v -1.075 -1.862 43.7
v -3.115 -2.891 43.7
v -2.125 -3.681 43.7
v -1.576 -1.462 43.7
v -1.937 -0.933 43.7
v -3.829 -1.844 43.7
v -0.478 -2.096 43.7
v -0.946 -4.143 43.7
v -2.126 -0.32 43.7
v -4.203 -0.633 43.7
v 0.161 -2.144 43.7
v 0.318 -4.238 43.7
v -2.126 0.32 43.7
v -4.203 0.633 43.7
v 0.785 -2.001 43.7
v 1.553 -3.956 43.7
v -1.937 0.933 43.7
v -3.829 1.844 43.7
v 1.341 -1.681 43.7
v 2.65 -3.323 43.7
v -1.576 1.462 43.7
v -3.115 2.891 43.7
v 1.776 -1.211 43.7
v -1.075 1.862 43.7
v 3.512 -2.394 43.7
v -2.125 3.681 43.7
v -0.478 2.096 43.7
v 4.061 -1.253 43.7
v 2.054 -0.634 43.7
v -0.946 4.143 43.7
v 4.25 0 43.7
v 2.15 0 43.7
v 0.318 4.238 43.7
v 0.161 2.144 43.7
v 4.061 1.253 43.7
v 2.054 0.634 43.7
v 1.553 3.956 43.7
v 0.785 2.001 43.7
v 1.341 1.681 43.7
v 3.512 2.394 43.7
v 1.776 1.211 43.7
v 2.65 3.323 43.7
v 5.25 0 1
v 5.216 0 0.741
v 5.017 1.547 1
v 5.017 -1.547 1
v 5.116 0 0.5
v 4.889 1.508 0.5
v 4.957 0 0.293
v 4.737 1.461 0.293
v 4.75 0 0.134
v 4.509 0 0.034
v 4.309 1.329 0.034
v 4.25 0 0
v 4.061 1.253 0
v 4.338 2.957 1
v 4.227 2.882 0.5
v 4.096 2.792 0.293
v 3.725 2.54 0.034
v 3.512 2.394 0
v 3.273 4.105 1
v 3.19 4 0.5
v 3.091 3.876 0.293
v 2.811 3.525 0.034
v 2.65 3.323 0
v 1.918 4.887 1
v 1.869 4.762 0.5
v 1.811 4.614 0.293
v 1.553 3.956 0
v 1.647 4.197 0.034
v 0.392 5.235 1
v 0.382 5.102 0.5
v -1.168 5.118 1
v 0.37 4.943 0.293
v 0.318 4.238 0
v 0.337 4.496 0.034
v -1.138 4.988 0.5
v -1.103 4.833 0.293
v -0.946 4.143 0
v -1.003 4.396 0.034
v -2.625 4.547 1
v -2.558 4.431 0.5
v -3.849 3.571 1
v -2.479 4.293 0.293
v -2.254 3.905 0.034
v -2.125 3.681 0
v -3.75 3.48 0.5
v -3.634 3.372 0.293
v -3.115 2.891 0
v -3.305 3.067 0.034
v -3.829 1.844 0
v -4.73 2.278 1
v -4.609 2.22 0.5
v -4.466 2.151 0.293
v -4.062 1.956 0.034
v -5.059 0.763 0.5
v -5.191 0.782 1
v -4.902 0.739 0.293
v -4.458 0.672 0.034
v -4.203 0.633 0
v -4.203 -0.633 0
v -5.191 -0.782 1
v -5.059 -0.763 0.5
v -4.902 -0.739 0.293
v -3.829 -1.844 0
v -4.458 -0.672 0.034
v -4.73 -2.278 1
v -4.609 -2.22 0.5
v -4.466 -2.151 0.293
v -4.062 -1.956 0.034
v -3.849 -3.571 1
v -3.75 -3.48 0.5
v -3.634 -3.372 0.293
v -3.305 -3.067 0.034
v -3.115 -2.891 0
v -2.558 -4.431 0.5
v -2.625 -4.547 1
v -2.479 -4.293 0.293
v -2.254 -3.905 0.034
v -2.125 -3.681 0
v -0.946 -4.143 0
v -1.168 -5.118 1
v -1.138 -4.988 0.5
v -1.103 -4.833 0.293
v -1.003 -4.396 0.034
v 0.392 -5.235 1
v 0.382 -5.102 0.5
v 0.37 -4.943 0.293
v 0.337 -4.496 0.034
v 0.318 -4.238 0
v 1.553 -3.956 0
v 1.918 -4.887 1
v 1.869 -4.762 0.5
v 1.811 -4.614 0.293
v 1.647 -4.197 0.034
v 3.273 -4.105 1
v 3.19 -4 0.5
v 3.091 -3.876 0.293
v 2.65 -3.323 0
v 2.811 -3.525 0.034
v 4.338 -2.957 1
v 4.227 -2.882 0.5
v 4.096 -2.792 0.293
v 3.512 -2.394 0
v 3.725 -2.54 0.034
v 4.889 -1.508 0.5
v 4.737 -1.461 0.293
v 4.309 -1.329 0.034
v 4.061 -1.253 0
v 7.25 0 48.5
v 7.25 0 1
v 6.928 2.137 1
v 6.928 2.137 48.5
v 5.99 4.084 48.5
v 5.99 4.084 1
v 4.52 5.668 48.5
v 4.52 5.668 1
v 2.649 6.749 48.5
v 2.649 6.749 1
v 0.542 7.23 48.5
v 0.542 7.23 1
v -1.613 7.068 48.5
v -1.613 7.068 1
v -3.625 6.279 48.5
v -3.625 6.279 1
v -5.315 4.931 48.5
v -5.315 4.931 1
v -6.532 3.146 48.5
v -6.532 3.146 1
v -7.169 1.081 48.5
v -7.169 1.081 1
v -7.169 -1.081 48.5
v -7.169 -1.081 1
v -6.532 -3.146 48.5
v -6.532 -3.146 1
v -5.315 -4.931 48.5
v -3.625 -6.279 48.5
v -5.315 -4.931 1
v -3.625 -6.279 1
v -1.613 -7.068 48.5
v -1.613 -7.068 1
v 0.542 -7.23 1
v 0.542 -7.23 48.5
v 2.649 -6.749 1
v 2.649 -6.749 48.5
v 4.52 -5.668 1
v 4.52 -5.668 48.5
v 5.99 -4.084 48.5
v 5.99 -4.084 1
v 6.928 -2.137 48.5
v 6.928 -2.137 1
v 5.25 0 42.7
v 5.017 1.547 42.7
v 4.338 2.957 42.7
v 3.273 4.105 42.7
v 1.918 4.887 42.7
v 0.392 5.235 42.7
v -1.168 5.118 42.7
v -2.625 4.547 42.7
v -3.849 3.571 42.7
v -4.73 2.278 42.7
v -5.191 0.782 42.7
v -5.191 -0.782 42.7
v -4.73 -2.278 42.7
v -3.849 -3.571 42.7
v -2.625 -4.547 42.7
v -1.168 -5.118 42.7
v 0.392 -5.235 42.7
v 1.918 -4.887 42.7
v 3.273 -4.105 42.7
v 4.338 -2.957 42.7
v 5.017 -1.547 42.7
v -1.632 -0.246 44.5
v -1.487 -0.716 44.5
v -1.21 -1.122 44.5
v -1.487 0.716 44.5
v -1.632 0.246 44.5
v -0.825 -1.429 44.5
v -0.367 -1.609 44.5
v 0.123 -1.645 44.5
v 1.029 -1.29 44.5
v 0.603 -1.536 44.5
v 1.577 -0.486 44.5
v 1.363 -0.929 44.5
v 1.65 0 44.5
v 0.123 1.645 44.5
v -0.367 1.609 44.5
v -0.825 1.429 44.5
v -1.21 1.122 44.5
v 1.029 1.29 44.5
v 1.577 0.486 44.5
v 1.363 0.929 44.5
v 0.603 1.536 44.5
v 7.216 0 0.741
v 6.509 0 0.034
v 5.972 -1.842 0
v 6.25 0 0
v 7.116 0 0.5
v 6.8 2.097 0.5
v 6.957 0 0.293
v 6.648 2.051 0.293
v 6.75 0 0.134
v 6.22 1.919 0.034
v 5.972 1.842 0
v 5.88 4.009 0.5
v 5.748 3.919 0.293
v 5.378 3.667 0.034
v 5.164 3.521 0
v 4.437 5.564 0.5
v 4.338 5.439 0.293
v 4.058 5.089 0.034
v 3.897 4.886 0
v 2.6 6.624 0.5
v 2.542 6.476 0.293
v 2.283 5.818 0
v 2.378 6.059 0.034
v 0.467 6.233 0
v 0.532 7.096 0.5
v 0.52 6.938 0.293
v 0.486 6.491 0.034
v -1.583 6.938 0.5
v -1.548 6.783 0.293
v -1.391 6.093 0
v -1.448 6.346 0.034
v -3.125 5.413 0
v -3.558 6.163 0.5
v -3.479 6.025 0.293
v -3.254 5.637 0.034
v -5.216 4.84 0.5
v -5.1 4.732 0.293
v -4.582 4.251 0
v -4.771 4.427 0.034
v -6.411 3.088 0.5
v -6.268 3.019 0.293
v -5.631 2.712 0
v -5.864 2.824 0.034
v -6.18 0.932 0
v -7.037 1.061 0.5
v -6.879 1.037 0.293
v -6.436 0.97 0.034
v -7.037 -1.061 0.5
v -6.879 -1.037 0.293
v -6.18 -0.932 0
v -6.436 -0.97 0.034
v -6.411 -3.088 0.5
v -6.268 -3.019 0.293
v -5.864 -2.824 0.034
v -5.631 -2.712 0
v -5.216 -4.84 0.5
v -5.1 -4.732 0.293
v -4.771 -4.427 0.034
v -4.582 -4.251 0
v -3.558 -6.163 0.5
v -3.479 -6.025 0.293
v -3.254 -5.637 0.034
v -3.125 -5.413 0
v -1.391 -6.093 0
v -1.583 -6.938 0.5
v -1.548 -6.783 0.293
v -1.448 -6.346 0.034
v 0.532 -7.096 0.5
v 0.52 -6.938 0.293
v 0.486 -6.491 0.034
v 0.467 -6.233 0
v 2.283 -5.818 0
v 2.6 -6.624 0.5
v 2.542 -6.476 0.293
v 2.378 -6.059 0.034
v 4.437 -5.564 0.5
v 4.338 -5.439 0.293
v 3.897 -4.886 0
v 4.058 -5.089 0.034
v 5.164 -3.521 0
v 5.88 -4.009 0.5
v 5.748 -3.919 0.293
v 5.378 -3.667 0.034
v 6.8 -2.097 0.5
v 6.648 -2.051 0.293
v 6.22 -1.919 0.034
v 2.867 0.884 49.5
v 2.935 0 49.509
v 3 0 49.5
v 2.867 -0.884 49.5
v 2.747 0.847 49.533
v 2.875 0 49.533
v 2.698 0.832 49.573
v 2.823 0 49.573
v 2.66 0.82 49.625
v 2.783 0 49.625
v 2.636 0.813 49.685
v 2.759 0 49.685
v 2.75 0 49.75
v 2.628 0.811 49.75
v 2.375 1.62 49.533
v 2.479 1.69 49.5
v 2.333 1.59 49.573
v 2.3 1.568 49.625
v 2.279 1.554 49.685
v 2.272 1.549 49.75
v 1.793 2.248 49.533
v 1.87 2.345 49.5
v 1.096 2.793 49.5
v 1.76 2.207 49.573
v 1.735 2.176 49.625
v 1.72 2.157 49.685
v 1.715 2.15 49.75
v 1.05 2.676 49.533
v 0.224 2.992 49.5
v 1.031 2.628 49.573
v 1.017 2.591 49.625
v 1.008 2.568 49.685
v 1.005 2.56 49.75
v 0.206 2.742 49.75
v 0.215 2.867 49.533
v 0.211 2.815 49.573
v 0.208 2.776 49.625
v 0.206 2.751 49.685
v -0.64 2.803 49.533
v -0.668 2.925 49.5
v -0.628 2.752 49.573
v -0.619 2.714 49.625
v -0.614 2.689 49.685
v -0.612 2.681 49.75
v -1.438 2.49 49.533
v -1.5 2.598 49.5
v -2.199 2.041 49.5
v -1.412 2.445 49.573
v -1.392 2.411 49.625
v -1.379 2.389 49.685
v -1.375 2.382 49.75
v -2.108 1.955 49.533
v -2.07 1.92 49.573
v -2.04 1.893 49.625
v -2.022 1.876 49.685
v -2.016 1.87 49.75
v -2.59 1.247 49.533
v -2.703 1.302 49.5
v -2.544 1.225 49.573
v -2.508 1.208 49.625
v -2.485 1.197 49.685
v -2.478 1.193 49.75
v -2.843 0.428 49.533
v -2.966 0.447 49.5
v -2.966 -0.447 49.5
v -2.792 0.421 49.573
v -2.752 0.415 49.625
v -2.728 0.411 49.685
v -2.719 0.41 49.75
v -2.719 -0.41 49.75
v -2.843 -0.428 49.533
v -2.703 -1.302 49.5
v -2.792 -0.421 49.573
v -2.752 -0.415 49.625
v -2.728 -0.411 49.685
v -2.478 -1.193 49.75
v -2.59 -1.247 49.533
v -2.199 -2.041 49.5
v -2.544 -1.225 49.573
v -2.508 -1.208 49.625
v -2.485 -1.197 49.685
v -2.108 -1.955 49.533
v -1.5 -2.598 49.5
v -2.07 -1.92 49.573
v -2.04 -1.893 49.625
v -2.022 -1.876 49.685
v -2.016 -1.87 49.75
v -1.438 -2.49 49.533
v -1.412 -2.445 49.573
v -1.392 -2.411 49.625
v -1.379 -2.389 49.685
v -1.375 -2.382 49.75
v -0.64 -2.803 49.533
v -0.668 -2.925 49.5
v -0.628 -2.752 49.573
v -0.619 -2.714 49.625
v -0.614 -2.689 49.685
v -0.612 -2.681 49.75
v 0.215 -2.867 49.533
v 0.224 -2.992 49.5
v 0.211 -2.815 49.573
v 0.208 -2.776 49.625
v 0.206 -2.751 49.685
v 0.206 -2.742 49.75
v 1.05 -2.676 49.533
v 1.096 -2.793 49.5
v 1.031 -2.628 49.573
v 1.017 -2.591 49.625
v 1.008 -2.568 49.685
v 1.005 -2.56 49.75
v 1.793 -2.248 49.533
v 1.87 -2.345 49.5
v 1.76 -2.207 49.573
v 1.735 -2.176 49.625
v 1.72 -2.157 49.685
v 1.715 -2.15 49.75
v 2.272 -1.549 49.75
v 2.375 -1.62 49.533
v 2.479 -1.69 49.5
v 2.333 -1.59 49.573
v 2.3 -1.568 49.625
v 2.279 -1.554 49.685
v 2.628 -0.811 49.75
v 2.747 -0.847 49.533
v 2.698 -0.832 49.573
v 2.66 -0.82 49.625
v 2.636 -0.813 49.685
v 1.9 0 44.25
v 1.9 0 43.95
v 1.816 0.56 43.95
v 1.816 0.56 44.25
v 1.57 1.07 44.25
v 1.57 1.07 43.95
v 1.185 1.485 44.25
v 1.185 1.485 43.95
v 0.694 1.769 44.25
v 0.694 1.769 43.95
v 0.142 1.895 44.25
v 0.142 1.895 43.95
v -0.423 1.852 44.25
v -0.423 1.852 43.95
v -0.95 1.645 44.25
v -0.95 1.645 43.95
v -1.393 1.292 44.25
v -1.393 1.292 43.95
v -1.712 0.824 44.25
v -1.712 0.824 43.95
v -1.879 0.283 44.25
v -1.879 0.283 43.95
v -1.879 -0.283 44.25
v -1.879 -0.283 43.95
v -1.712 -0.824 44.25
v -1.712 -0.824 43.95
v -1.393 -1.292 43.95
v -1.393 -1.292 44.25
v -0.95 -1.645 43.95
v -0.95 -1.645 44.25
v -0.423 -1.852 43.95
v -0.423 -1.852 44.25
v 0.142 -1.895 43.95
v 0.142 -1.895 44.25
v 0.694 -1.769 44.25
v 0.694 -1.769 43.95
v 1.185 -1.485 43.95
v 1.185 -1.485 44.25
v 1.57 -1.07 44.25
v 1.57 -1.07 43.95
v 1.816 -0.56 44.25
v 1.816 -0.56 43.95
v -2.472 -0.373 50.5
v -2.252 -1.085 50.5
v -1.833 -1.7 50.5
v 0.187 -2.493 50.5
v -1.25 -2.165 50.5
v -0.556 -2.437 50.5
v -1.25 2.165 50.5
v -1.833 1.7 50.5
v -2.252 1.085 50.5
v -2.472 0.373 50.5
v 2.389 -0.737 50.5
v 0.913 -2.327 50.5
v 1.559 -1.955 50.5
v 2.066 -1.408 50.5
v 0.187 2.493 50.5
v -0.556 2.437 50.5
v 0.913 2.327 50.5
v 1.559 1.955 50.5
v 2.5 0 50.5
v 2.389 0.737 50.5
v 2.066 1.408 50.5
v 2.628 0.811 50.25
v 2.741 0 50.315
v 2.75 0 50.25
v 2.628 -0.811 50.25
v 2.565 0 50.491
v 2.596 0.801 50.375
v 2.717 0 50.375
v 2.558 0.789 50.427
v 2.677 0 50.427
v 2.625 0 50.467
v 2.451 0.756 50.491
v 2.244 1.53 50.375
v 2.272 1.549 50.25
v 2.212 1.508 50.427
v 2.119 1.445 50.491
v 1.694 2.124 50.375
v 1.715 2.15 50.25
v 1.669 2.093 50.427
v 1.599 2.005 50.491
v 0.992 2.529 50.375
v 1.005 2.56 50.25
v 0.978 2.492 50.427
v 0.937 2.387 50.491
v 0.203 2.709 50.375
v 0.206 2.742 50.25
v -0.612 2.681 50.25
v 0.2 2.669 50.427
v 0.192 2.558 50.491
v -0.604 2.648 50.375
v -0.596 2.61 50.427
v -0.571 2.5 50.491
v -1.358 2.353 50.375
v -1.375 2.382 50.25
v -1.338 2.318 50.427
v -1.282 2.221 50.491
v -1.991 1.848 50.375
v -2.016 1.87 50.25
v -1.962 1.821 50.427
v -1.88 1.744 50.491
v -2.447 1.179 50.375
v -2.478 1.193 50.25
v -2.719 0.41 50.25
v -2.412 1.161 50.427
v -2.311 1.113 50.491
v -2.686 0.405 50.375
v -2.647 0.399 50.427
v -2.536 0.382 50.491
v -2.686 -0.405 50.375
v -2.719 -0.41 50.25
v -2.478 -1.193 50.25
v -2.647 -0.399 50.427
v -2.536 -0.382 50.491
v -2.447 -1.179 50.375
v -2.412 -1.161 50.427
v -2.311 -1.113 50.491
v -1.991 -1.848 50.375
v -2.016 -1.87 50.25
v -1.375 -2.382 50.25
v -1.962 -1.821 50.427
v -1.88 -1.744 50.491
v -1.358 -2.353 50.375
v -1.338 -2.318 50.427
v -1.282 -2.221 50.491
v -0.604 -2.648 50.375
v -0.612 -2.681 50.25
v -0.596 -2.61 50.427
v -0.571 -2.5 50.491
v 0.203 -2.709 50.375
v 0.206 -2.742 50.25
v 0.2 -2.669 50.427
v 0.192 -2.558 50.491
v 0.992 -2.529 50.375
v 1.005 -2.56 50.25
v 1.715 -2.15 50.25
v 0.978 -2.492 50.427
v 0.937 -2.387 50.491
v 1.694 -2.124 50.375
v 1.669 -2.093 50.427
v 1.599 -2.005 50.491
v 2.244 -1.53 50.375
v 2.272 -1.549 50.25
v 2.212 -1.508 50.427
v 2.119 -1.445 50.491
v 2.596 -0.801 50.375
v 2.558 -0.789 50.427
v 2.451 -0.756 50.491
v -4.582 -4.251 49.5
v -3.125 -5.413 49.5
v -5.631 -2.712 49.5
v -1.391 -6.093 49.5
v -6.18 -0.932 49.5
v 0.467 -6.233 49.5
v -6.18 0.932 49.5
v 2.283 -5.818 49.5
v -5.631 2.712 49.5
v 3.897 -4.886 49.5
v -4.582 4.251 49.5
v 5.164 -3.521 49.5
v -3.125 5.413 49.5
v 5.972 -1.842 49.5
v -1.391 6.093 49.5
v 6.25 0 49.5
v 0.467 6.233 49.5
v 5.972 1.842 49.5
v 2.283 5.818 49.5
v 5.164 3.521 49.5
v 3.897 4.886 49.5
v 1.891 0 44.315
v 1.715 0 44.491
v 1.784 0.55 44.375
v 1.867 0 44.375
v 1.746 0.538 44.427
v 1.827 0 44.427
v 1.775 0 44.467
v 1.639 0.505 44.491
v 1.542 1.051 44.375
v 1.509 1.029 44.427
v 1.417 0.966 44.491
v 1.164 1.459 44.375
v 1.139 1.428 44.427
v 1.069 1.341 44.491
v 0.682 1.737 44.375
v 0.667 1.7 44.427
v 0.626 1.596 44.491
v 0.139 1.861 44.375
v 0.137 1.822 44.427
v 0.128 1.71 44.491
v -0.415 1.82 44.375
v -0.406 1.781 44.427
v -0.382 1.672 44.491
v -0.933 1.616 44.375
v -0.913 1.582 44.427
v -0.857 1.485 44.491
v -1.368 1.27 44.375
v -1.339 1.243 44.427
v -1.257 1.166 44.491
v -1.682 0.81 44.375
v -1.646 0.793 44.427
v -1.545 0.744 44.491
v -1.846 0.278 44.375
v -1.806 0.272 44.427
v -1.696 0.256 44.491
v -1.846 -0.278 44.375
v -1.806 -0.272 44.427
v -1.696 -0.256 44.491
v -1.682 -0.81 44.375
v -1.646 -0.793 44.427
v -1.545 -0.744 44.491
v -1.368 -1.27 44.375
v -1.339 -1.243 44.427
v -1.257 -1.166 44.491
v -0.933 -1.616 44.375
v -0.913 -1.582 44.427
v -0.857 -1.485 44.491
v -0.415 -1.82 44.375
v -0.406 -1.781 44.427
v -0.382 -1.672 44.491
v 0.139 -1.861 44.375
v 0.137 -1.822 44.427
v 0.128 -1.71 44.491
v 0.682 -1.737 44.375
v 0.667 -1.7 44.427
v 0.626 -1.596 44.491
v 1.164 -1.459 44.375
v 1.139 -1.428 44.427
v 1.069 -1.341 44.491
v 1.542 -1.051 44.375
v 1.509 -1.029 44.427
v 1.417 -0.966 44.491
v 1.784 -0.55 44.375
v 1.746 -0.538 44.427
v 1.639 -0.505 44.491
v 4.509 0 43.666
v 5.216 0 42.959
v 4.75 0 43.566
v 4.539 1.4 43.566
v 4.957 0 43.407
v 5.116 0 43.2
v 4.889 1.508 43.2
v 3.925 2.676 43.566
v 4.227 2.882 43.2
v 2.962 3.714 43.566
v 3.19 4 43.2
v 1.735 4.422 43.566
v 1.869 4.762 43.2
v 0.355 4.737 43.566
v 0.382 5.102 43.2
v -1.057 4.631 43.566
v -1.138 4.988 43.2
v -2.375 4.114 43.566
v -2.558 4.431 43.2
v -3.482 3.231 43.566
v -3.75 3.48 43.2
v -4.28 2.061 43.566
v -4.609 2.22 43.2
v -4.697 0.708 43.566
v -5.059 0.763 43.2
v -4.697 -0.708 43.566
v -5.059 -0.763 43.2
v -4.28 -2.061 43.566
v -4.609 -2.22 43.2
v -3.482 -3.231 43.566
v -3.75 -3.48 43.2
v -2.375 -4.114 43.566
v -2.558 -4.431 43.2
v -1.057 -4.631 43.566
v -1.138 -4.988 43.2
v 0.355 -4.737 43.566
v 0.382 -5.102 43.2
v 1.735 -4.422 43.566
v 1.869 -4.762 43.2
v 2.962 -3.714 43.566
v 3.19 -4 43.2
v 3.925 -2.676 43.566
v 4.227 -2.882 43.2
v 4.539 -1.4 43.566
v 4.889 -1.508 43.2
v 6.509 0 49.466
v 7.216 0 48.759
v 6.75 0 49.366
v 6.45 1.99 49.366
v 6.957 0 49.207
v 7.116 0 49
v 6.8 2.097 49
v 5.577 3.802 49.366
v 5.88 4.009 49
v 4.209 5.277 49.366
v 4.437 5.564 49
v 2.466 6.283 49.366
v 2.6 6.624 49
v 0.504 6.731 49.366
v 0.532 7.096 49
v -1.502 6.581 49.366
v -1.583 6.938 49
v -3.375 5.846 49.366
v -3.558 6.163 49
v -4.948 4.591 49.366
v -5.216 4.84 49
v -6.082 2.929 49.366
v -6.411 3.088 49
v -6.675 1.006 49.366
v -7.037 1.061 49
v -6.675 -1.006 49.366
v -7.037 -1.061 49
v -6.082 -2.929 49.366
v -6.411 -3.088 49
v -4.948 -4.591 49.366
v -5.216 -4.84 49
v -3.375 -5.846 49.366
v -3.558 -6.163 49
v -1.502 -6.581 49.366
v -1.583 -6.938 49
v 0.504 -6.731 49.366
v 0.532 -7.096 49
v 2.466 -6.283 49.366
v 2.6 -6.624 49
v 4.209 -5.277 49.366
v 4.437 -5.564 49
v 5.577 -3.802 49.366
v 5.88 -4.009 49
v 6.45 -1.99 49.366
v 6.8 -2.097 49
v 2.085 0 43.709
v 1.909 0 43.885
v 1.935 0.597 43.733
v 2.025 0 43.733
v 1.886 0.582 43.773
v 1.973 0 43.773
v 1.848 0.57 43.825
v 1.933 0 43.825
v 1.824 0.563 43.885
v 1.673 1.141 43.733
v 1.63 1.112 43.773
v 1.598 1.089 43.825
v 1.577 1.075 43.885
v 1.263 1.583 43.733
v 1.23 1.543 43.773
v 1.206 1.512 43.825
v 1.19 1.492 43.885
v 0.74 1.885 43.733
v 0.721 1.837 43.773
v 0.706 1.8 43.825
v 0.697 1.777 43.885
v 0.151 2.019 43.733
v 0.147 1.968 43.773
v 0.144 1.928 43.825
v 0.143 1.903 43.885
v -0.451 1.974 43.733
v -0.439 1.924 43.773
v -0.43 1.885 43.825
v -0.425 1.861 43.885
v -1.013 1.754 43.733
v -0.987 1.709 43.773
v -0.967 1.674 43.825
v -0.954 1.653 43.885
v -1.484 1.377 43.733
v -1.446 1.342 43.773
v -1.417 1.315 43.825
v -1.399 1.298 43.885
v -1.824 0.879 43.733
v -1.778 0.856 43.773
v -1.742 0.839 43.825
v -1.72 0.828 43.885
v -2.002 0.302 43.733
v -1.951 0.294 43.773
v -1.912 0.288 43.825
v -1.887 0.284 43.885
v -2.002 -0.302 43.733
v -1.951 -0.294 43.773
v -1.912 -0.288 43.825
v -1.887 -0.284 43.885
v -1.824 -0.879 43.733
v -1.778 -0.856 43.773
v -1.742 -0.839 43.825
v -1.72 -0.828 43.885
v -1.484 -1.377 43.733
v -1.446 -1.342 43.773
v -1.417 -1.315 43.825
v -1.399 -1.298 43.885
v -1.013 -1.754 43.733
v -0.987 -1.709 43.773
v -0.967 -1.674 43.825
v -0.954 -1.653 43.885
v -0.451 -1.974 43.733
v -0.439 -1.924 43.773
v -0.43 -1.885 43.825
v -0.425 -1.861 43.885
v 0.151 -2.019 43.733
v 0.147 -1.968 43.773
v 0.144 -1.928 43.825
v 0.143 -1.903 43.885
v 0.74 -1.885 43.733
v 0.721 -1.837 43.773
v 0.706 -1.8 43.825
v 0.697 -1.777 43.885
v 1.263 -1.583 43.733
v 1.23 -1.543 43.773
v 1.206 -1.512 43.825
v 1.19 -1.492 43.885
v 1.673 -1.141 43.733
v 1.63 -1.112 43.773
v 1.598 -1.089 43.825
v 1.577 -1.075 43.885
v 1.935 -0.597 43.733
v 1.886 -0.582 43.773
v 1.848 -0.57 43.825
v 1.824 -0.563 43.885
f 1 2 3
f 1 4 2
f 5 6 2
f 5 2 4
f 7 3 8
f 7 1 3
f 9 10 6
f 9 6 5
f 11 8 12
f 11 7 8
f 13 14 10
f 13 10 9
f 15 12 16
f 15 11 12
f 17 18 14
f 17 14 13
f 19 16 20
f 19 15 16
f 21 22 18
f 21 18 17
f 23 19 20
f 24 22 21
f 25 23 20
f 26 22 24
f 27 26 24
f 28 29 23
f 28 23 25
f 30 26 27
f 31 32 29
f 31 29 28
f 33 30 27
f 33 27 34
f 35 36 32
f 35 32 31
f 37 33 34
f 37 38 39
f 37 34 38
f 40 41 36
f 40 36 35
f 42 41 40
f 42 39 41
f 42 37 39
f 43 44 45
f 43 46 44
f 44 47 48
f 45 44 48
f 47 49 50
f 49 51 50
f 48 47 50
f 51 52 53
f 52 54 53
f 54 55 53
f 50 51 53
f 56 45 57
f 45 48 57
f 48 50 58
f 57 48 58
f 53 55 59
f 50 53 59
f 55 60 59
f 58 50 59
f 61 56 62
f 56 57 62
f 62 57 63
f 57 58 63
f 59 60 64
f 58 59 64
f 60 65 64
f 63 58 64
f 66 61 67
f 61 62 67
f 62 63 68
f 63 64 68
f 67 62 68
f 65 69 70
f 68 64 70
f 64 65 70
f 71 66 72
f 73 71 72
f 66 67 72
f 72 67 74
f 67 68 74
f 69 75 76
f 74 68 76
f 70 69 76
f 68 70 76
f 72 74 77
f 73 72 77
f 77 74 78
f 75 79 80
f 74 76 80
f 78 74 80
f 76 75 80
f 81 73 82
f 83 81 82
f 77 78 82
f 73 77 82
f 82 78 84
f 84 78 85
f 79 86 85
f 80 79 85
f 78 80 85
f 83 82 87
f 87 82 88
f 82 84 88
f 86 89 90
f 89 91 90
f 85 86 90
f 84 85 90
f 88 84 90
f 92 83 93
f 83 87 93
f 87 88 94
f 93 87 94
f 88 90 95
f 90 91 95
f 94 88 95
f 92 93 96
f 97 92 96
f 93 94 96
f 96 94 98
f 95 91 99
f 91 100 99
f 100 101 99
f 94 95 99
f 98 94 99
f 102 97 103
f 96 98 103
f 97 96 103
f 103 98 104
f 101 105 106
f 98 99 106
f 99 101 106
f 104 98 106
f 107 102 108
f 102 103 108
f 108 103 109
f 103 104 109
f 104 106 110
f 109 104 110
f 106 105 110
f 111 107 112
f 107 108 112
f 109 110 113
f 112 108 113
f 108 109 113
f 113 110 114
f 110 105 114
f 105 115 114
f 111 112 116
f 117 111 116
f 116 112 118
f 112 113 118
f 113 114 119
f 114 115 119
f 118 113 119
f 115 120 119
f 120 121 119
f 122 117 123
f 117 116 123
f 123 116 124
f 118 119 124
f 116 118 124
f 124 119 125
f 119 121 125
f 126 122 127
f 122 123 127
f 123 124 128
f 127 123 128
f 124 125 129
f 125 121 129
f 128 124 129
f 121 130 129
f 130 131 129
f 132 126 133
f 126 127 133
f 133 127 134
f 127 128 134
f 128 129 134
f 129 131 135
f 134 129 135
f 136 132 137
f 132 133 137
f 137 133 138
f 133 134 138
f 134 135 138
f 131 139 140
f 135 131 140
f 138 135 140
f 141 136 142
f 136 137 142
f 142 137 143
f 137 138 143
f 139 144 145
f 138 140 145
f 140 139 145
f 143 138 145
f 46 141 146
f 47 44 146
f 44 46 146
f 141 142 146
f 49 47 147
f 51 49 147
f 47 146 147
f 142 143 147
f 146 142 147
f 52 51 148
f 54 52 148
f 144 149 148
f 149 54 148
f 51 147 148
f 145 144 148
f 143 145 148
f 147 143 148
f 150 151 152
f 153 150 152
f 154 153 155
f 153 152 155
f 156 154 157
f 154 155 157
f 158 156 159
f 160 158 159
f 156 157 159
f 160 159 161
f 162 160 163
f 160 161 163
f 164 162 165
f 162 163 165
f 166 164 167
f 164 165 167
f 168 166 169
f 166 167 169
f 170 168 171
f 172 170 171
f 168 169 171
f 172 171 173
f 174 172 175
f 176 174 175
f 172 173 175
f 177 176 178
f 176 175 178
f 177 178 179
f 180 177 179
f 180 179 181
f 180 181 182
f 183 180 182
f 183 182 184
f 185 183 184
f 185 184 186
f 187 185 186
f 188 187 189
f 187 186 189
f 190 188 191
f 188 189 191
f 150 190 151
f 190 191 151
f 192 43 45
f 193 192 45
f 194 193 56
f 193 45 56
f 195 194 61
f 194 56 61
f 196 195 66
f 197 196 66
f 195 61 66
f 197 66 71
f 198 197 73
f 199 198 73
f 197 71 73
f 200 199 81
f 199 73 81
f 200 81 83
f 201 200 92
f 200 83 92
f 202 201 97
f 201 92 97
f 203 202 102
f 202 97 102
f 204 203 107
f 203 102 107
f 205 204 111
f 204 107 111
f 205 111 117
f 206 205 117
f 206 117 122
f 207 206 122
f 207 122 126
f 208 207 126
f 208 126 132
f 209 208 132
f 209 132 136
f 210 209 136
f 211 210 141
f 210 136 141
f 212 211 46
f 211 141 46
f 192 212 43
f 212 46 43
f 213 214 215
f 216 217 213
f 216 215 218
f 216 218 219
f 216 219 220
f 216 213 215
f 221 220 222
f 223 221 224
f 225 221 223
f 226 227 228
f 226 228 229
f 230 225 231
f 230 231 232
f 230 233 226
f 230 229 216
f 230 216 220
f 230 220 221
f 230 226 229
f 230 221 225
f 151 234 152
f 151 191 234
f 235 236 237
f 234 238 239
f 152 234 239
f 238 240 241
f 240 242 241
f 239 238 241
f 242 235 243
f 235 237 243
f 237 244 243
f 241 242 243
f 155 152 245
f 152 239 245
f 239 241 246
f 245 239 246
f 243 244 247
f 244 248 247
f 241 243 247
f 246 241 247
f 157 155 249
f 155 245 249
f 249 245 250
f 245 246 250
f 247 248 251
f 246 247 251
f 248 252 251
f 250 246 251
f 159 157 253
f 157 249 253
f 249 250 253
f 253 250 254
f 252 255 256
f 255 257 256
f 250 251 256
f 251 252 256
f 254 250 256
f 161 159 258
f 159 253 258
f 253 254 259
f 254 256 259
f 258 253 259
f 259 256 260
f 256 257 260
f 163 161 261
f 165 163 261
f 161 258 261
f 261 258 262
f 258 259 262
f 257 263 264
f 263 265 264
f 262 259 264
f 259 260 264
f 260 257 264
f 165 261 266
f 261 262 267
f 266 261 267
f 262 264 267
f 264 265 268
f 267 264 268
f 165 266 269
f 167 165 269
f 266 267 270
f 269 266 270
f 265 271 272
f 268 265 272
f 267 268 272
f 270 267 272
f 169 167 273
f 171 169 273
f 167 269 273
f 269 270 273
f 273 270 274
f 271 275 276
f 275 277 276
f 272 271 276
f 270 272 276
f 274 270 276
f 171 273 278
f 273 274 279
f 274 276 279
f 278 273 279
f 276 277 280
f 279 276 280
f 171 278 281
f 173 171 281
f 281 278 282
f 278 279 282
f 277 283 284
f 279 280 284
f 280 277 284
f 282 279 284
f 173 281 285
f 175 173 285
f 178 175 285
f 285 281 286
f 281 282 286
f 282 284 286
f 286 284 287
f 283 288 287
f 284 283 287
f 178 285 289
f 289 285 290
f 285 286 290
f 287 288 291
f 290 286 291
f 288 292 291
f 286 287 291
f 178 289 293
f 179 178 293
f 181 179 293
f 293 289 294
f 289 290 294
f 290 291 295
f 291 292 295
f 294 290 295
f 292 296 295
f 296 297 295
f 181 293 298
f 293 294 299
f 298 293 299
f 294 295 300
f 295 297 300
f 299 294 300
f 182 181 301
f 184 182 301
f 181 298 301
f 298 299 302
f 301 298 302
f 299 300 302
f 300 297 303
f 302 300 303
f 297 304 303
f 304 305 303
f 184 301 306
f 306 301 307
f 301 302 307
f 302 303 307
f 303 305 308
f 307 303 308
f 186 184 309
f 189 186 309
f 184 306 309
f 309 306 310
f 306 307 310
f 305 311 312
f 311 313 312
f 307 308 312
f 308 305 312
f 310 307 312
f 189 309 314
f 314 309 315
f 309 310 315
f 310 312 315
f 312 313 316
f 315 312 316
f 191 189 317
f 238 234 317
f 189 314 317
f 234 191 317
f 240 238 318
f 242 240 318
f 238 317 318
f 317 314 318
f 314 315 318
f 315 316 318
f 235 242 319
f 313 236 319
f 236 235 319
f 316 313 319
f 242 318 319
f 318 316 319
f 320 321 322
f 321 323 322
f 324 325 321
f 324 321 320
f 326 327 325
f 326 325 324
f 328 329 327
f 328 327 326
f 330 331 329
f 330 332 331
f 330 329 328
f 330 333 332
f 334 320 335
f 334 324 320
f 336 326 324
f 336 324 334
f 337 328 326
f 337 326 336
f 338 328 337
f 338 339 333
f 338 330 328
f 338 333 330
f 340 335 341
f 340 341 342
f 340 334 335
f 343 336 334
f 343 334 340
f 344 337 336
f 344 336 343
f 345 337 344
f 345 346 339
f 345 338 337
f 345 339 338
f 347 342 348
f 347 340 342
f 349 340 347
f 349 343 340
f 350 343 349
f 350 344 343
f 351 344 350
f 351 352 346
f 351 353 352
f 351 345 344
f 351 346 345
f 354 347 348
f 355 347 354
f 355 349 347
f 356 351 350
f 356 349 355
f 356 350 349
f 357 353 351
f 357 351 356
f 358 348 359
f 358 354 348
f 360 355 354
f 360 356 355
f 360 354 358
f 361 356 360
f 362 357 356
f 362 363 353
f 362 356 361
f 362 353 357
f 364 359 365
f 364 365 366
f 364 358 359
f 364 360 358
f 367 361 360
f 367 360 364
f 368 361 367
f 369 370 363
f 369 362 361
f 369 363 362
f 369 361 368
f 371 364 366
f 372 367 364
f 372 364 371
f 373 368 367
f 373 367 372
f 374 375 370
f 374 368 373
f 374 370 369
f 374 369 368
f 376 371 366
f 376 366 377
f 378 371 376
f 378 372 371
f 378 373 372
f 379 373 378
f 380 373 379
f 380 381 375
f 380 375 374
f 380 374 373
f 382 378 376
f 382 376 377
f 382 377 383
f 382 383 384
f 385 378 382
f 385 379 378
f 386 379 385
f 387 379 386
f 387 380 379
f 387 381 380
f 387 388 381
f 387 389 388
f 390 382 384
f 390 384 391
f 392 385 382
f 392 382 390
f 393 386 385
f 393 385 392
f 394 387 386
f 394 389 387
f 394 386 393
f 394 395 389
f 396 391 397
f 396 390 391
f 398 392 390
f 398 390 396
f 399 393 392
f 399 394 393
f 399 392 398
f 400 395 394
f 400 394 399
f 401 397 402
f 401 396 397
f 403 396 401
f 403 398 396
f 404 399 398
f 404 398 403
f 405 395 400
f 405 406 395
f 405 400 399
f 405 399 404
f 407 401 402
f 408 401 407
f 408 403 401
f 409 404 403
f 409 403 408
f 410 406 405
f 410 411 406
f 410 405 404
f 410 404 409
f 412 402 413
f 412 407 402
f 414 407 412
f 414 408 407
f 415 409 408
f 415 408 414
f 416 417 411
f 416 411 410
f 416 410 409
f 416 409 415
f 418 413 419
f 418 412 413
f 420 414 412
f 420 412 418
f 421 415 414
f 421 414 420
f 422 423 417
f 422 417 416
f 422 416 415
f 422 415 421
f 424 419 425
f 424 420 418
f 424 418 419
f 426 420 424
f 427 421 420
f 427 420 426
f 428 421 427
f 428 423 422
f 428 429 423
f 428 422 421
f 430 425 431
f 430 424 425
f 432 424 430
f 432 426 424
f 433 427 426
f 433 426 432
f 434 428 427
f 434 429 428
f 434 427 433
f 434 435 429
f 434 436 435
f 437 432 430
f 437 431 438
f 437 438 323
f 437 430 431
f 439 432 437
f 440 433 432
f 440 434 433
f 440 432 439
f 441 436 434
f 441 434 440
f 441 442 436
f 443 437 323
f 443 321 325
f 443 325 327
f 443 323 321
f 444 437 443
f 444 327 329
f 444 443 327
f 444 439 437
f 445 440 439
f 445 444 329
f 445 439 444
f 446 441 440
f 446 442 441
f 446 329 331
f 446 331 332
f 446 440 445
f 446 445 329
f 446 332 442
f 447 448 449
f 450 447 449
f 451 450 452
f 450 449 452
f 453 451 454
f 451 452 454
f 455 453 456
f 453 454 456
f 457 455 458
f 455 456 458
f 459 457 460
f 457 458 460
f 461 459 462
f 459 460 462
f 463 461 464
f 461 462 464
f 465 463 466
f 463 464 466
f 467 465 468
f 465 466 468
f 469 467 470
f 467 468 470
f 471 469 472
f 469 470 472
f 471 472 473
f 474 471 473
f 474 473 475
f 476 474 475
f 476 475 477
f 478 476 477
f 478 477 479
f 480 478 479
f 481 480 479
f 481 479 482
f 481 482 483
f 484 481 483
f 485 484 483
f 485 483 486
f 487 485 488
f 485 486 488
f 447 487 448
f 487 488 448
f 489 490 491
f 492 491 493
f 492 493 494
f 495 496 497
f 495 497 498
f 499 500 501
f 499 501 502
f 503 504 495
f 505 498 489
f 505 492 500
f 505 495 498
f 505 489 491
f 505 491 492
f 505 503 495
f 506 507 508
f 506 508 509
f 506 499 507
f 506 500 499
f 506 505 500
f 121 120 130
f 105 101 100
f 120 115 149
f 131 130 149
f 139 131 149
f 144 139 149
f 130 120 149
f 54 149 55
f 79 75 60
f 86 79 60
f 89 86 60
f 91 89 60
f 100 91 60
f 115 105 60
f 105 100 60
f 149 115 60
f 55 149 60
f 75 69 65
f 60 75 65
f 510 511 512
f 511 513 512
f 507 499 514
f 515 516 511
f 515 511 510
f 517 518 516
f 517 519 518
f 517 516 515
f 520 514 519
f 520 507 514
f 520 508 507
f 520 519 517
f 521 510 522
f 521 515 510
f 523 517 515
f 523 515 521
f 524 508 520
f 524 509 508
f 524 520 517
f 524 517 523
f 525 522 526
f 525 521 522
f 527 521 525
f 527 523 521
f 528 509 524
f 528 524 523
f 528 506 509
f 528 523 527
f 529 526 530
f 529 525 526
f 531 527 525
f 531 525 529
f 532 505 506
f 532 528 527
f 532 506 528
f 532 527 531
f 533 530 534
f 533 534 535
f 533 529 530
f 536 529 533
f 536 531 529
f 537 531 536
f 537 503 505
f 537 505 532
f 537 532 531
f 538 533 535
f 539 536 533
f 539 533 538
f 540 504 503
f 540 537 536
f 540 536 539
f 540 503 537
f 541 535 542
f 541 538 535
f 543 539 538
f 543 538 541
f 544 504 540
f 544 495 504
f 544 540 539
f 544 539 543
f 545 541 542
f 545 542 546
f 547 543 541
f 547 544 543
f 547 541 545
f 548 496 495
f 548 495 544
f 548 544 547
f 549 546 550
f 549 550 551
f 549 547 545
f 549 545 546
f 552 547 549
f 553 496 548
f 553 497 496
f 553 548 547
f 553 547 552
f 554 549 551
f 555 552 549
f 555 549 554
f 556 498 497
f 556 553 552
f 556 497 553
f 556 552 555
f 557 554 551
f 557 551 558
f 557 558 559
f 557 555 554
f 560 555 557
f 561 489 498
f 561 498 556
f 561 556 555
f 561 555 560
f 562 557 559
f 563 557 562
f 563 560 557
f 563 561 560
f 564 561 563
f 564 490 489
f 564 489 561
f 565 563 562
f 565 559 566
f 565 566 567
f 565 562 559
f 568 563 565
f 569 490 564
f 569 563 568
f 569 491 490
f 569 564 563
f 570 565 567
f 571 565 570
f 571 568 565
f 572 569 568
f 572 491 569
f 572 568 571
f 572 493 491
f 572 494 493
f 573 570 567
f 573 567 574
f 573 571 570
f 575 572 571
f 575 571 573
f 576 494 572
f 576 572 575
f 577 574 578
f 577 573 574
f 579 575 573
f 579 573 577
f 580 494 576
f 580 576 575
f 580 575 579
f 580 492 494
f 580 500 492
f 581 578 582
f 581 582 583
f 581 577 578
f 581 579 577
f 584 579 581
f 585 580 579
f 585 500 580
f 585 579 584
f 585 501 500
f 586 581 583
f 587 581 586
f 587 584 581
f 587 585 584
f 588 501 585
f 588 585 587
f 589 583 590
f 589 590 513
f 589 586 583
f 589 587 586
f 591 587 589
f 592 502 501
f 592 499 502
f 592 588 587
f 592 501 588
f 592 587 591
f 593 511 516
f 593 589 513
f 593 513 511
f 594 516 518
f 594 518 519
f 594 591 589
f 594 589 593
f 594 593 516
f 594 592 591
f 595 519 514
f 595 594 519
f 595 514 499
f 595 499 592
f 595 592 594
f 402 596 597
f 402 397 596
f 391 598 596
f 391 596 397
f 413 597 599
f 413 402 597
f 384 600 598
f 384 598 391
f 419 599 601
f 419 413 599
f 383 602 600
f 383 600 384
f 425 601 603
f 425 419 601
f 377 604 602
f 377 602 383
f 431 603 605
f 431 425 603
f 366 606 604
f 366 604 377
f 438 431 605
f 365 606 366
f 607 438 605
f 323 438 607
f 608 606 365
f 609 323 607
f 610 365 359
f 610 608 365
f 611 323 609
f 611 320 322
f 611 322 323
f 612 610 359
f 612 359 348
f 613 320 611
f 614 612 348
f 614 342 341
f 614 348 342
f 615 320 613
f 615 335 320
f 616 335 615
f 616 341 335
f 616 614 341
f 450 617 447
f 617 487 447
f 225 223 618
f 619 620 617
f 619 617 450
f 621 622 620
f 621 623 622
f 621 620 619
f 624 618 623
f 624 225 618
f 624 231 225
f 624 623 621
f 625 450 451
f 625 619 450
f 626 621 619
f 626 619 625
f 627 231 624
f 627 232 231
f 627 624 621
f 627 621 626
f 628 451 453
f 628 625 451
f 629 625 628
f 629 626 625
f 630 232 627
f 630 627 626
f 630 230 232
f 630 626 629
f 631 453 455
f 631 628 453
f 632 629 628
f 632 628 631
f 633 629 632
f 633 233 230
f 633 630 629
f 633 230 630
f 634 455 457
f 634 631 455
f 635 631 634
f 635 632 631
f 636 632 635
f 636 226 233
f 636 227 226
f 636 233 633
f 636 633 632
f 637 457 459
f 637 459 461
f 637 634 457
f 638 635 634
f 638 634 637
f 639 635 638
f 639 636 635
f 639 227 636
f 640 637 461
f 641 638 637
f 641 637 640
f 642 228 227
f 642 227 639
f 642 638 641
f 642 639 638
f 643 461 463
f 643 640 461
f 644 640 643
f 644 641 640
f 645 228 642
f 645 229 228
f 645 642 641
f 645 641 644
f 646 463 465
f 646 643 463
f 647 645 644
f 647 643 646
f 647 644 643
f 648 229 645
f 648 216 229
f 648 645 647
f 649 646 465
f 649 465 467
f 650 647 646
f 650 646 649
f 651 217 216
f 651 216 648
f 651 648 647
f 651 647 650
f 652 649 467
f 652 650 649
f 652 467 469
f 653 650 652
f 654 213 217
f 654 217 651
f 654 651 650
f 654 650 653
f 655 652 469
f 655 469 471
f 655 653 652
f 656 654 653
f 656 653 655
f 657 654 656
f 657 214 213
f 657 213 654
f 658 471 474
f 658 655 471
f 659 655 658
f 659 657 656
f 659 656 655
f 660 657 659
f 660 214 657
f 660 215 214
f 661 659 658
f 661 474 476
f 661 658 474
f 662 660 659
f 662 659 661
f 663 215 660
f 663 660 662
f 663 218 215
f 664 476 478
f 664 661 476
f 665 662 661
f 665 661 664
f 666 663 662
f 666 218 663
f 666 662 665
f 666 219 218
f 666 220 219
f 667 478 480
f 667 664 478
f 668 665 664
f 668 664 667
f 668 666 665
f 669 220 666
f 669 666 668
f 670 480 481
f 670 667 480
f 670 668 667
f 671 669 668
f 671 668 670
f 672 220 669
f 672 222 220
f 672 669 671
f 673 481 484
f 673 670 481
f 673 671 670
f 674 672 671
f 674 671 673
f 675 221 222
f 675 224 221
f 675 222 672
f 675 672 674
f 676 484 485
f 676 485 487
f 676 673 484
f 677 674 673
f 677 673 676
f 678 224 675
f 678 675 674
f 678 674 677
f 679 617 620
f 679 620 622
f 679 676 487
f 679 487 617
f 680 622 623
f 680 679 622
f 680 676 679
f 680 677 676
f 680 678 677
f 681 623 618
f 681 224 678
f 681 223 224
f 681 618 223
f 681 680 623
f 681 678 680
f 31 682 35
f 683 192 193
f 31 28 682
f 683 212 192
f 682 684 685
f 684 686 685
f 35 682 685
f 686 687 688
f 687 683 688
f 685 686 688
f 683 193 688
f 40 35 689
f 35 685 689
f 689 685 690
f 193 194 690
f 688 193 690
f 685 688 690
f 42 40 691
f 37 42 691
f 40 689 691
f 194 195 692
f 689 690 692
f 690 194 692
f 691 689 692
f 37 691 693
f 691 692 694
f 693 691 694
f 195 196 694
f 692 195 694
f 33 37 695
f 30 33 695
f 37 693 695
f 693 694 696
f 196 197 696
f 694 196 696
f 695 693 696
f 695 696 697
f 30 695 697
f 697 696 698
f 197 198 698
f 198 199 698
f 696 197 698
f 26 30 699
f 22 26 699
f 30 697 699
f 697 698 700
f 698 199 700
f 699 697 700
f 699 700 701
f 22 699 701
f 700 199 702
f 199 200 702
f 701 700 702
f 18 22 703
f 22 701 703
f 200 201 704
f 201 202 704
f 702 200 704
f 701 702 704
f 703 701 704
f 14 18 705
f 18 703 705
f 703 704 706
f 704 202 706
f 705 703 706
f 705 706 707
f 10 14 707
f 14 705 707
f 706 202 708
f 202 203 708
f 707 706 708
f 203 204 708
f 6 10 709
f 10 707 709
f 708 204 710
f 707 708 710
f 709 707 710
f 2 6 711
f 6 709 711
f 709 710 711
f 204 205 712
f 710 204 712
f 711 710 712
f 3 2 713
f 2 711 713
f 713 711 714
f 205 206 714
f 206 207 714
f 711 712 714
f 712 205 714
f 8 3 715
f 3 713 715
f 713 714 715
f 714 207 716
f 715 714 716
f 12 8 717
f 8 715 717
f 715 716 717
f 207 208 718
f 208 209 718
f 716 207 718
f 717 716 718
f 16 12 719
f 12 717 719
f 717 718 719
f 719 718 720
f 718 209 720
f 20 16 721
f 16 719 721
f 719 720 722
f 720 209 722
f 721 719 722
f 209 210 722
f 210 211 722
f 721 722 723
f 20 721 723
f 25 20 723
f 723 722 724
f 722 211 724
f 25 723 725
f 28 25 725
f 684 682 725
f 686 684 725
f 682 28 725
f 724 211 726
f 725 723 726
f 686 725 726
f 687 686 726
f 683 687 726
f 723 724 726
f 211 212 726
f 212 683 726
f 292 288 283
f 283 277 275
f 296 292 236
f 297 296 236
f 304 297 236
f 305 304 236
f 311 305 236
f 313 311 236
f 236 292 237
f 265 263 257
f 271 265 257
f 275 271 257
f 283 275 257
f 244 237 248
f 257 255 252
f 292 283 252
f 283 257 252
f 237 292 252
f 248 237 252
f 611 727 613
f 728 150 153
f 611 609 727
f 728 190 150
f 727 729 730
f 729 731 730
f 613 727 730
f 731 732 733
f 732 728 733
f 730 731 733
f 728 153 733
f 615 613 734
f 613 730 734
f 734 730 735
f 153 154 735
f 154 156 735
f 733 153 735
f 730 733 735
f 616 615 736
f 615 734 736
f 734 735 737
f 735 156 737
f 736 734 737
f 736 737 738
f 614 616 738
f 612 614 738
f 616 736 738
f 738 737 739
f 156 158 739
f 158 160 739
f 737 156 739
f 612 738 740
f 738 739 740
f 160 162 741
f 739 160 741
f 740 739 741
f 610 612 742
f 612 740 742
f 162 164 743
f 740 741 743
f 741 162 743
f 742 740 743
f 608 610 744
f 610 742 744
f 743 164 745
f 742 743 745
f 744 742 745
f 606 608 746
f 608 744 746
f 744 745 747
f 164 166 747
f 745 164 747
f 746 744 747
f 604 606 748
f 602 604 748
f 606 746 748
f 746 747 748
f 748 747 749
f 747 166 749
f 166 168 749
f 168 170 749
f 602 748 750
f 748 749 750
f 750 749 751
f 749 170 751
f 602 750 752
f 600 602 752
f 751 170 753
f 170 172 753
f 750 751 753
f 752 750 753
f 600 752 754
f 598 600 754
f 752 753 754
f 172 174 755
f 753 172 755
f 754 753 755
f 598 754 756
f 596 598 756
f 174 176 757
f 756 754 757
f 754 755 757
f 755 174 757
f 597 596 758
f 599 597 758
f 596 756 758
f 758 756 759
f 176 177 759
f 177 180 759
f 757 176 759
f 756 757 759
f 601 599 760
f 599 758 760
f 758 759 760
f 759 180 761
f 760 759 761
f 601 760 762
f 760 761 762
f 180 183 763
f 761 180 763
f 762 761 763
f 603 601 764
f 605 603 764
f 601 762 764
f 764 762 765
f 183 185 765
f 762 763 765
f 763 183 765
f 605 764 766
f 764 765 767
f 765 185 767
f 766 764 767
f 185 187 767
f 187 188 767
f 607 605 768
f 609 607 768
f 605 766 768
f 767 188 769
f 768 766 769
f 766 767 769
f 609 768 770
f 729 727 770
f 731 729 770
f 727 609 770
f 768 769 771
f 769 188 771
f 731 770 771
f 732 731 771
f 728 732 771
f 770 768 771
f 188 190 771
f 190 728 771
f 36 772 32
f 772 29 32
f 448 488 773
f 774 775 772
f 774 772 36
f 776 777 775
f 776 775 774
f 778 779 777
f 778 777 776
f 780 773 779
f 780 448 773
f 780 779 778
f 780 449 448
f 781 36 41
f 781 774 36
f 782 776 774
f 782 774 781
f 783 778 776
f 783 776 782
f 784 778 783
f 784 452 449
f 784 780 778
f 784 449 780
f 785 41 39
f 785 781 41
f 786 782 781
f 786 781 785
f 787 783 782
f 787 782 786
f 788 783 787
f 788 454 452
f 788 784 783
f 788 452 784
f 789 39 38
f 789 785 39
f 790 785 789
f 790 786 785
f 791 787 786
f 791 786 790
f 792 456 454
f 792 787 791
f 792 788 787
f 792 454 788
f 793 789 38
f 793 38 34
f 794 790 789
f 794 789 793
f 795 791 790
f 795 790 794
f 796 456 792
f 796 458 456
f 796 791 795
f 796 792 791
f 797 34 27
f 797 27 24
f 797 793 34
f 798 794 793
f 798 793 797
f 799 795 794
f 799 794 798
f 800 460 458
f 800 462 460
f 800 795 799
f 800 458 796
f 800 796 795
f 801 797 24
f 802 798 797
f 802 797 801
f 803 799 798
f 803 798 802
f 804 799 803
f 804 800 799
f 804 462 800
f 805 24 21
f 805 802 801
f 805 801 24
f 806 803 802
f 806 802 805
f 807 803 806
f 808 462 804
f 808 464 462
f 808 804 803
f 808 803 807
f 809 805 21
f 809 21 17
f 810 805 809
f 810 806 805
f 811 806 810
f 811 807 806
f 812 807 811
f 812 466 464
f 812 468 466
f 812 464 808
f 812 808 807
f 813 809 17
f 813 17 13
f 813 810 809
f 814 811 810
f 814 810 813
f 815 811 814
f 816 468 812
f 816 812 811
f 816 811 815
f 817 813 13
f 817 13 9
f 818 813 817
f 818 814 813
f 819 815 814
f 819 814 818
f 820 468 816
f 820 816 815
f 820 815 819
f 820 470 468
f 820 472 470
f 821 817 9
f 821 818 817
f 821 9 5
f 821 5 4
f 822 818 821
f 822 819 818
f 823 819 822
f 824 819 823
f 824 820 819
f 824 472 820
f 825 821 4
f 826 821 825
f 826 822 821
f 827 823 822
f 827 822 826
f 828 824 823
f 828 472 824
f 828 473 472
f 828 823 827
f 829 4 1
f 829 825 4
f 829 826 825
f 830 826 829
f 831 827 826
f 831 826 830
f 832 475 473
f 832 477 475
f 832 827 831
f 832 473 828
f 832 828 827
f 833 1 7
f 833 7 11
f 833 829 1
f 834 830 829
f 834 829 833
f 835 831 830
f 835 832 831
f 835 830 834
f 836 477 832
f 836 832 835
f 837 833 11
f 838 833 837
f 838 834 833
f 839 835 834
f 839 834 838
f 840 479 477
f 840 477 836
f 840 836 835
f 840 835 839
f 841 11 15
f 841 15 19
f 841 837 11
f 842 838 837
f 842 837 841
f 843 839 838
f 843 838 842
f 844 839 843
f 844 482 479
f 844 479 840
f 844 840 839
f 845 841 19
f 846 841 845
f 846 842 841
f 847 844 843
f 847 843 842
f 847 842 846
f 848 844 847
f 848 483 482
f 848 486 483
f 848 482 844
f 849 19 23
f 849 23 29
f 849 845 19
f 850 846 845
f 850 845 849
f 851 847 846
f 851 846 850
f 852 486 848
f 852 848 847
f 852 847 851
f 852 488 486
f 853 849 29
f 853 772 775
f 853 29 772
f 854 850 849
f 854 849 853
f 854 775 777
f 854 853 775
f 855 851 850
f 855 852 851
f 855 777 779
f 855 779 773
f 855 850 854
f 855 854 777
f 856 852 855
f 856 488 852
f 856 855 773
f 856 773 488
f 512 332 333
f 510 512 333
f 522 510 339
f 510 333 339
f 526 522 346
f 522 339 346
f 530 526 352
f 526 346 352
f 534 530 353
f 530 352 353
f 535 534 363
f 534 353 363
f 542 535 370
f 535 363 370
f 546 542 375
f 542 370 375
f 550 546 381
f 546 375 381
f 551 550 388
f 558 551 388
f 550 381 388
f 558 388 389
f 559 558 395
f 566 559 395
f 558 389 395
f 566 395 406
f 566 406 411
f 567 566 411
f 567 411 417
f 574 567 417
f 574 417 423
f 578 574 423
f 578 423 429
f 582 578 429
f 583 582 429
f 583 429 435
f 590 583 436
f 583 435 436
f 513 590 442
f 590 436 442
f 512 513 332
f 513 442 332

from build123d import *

# Parameters (mm, degrees)
F0_R     = 5.25
F1_DEPTH = 43.7
F2_R     = 1.9
F3_DEPTH = 0.8
F4_R     = 0.25
F5_R     = 1
F6_R     = 7.25
F7_DEPTH = 49.5
F8_R     = 2.75
F9_DEPTH = 1
F10_R    = 0.25
F11_R    = 1


with BuildPart() as f1:
    # F0 (on Top) → F1 (new body)
    with BuildSketch(Plane.XY):
        Circle(F0_R)
    extrude(amount=F1_DEPTH)

    # F2 (on face) → F3 (join)
    with BuildSketch(Plane.XY.offset(43.7)):
        Circle(F2_R)
    extrude(amount=F3_DEPTH)

    # F4
    f4_edges = [f1.edges().sort_by_distance(p)[0] for p in [
        (-1.9, 0, 43.7),
        (-1.9, 0, 44.5),
    ]]
    fillet(f4_edges, radius=F4_R)

    # F5
    f5_edges = [f1.edges().sort_by_distance(p)[0] for p in [
        (-5.25, 0, 43.7),
        (-5.25, 0, 0),
    ]]
    fillet(f5_edges, radius=F5_R)


with BuildPart() as f7:
    # F6 (on Top) → F7 (new body)
    with BuildSketch(Plane.XY):
        Circle(F6_R)
    extrude(amount=F7_DEPTH)

    # F8 (on face) → F9 (join)
    with BuildSketch(Plane.XY.offset(49.5)):
        Circle(F8_R)
    extrude(amount=F9_DEPTH)

    # F10
    f10_edges = [f7.edges().sort_by_distance(p)[0] for p in [
        (-2.75, 0, 50.5),
        (-2.75, 0, 49.5),
    ]]
    fillet(f10_edges, radius=F10_R)

    # F11
    f11_edges = [f7.edges().sort_by_distance(p)[0] for p in [
        (-7.25, 0, 49.5),
        (-7.25, 0, 0),
    ]]
    fillet(f11_edges, radius=F11_R)


solid = Compound([f1.part, f7.part])
